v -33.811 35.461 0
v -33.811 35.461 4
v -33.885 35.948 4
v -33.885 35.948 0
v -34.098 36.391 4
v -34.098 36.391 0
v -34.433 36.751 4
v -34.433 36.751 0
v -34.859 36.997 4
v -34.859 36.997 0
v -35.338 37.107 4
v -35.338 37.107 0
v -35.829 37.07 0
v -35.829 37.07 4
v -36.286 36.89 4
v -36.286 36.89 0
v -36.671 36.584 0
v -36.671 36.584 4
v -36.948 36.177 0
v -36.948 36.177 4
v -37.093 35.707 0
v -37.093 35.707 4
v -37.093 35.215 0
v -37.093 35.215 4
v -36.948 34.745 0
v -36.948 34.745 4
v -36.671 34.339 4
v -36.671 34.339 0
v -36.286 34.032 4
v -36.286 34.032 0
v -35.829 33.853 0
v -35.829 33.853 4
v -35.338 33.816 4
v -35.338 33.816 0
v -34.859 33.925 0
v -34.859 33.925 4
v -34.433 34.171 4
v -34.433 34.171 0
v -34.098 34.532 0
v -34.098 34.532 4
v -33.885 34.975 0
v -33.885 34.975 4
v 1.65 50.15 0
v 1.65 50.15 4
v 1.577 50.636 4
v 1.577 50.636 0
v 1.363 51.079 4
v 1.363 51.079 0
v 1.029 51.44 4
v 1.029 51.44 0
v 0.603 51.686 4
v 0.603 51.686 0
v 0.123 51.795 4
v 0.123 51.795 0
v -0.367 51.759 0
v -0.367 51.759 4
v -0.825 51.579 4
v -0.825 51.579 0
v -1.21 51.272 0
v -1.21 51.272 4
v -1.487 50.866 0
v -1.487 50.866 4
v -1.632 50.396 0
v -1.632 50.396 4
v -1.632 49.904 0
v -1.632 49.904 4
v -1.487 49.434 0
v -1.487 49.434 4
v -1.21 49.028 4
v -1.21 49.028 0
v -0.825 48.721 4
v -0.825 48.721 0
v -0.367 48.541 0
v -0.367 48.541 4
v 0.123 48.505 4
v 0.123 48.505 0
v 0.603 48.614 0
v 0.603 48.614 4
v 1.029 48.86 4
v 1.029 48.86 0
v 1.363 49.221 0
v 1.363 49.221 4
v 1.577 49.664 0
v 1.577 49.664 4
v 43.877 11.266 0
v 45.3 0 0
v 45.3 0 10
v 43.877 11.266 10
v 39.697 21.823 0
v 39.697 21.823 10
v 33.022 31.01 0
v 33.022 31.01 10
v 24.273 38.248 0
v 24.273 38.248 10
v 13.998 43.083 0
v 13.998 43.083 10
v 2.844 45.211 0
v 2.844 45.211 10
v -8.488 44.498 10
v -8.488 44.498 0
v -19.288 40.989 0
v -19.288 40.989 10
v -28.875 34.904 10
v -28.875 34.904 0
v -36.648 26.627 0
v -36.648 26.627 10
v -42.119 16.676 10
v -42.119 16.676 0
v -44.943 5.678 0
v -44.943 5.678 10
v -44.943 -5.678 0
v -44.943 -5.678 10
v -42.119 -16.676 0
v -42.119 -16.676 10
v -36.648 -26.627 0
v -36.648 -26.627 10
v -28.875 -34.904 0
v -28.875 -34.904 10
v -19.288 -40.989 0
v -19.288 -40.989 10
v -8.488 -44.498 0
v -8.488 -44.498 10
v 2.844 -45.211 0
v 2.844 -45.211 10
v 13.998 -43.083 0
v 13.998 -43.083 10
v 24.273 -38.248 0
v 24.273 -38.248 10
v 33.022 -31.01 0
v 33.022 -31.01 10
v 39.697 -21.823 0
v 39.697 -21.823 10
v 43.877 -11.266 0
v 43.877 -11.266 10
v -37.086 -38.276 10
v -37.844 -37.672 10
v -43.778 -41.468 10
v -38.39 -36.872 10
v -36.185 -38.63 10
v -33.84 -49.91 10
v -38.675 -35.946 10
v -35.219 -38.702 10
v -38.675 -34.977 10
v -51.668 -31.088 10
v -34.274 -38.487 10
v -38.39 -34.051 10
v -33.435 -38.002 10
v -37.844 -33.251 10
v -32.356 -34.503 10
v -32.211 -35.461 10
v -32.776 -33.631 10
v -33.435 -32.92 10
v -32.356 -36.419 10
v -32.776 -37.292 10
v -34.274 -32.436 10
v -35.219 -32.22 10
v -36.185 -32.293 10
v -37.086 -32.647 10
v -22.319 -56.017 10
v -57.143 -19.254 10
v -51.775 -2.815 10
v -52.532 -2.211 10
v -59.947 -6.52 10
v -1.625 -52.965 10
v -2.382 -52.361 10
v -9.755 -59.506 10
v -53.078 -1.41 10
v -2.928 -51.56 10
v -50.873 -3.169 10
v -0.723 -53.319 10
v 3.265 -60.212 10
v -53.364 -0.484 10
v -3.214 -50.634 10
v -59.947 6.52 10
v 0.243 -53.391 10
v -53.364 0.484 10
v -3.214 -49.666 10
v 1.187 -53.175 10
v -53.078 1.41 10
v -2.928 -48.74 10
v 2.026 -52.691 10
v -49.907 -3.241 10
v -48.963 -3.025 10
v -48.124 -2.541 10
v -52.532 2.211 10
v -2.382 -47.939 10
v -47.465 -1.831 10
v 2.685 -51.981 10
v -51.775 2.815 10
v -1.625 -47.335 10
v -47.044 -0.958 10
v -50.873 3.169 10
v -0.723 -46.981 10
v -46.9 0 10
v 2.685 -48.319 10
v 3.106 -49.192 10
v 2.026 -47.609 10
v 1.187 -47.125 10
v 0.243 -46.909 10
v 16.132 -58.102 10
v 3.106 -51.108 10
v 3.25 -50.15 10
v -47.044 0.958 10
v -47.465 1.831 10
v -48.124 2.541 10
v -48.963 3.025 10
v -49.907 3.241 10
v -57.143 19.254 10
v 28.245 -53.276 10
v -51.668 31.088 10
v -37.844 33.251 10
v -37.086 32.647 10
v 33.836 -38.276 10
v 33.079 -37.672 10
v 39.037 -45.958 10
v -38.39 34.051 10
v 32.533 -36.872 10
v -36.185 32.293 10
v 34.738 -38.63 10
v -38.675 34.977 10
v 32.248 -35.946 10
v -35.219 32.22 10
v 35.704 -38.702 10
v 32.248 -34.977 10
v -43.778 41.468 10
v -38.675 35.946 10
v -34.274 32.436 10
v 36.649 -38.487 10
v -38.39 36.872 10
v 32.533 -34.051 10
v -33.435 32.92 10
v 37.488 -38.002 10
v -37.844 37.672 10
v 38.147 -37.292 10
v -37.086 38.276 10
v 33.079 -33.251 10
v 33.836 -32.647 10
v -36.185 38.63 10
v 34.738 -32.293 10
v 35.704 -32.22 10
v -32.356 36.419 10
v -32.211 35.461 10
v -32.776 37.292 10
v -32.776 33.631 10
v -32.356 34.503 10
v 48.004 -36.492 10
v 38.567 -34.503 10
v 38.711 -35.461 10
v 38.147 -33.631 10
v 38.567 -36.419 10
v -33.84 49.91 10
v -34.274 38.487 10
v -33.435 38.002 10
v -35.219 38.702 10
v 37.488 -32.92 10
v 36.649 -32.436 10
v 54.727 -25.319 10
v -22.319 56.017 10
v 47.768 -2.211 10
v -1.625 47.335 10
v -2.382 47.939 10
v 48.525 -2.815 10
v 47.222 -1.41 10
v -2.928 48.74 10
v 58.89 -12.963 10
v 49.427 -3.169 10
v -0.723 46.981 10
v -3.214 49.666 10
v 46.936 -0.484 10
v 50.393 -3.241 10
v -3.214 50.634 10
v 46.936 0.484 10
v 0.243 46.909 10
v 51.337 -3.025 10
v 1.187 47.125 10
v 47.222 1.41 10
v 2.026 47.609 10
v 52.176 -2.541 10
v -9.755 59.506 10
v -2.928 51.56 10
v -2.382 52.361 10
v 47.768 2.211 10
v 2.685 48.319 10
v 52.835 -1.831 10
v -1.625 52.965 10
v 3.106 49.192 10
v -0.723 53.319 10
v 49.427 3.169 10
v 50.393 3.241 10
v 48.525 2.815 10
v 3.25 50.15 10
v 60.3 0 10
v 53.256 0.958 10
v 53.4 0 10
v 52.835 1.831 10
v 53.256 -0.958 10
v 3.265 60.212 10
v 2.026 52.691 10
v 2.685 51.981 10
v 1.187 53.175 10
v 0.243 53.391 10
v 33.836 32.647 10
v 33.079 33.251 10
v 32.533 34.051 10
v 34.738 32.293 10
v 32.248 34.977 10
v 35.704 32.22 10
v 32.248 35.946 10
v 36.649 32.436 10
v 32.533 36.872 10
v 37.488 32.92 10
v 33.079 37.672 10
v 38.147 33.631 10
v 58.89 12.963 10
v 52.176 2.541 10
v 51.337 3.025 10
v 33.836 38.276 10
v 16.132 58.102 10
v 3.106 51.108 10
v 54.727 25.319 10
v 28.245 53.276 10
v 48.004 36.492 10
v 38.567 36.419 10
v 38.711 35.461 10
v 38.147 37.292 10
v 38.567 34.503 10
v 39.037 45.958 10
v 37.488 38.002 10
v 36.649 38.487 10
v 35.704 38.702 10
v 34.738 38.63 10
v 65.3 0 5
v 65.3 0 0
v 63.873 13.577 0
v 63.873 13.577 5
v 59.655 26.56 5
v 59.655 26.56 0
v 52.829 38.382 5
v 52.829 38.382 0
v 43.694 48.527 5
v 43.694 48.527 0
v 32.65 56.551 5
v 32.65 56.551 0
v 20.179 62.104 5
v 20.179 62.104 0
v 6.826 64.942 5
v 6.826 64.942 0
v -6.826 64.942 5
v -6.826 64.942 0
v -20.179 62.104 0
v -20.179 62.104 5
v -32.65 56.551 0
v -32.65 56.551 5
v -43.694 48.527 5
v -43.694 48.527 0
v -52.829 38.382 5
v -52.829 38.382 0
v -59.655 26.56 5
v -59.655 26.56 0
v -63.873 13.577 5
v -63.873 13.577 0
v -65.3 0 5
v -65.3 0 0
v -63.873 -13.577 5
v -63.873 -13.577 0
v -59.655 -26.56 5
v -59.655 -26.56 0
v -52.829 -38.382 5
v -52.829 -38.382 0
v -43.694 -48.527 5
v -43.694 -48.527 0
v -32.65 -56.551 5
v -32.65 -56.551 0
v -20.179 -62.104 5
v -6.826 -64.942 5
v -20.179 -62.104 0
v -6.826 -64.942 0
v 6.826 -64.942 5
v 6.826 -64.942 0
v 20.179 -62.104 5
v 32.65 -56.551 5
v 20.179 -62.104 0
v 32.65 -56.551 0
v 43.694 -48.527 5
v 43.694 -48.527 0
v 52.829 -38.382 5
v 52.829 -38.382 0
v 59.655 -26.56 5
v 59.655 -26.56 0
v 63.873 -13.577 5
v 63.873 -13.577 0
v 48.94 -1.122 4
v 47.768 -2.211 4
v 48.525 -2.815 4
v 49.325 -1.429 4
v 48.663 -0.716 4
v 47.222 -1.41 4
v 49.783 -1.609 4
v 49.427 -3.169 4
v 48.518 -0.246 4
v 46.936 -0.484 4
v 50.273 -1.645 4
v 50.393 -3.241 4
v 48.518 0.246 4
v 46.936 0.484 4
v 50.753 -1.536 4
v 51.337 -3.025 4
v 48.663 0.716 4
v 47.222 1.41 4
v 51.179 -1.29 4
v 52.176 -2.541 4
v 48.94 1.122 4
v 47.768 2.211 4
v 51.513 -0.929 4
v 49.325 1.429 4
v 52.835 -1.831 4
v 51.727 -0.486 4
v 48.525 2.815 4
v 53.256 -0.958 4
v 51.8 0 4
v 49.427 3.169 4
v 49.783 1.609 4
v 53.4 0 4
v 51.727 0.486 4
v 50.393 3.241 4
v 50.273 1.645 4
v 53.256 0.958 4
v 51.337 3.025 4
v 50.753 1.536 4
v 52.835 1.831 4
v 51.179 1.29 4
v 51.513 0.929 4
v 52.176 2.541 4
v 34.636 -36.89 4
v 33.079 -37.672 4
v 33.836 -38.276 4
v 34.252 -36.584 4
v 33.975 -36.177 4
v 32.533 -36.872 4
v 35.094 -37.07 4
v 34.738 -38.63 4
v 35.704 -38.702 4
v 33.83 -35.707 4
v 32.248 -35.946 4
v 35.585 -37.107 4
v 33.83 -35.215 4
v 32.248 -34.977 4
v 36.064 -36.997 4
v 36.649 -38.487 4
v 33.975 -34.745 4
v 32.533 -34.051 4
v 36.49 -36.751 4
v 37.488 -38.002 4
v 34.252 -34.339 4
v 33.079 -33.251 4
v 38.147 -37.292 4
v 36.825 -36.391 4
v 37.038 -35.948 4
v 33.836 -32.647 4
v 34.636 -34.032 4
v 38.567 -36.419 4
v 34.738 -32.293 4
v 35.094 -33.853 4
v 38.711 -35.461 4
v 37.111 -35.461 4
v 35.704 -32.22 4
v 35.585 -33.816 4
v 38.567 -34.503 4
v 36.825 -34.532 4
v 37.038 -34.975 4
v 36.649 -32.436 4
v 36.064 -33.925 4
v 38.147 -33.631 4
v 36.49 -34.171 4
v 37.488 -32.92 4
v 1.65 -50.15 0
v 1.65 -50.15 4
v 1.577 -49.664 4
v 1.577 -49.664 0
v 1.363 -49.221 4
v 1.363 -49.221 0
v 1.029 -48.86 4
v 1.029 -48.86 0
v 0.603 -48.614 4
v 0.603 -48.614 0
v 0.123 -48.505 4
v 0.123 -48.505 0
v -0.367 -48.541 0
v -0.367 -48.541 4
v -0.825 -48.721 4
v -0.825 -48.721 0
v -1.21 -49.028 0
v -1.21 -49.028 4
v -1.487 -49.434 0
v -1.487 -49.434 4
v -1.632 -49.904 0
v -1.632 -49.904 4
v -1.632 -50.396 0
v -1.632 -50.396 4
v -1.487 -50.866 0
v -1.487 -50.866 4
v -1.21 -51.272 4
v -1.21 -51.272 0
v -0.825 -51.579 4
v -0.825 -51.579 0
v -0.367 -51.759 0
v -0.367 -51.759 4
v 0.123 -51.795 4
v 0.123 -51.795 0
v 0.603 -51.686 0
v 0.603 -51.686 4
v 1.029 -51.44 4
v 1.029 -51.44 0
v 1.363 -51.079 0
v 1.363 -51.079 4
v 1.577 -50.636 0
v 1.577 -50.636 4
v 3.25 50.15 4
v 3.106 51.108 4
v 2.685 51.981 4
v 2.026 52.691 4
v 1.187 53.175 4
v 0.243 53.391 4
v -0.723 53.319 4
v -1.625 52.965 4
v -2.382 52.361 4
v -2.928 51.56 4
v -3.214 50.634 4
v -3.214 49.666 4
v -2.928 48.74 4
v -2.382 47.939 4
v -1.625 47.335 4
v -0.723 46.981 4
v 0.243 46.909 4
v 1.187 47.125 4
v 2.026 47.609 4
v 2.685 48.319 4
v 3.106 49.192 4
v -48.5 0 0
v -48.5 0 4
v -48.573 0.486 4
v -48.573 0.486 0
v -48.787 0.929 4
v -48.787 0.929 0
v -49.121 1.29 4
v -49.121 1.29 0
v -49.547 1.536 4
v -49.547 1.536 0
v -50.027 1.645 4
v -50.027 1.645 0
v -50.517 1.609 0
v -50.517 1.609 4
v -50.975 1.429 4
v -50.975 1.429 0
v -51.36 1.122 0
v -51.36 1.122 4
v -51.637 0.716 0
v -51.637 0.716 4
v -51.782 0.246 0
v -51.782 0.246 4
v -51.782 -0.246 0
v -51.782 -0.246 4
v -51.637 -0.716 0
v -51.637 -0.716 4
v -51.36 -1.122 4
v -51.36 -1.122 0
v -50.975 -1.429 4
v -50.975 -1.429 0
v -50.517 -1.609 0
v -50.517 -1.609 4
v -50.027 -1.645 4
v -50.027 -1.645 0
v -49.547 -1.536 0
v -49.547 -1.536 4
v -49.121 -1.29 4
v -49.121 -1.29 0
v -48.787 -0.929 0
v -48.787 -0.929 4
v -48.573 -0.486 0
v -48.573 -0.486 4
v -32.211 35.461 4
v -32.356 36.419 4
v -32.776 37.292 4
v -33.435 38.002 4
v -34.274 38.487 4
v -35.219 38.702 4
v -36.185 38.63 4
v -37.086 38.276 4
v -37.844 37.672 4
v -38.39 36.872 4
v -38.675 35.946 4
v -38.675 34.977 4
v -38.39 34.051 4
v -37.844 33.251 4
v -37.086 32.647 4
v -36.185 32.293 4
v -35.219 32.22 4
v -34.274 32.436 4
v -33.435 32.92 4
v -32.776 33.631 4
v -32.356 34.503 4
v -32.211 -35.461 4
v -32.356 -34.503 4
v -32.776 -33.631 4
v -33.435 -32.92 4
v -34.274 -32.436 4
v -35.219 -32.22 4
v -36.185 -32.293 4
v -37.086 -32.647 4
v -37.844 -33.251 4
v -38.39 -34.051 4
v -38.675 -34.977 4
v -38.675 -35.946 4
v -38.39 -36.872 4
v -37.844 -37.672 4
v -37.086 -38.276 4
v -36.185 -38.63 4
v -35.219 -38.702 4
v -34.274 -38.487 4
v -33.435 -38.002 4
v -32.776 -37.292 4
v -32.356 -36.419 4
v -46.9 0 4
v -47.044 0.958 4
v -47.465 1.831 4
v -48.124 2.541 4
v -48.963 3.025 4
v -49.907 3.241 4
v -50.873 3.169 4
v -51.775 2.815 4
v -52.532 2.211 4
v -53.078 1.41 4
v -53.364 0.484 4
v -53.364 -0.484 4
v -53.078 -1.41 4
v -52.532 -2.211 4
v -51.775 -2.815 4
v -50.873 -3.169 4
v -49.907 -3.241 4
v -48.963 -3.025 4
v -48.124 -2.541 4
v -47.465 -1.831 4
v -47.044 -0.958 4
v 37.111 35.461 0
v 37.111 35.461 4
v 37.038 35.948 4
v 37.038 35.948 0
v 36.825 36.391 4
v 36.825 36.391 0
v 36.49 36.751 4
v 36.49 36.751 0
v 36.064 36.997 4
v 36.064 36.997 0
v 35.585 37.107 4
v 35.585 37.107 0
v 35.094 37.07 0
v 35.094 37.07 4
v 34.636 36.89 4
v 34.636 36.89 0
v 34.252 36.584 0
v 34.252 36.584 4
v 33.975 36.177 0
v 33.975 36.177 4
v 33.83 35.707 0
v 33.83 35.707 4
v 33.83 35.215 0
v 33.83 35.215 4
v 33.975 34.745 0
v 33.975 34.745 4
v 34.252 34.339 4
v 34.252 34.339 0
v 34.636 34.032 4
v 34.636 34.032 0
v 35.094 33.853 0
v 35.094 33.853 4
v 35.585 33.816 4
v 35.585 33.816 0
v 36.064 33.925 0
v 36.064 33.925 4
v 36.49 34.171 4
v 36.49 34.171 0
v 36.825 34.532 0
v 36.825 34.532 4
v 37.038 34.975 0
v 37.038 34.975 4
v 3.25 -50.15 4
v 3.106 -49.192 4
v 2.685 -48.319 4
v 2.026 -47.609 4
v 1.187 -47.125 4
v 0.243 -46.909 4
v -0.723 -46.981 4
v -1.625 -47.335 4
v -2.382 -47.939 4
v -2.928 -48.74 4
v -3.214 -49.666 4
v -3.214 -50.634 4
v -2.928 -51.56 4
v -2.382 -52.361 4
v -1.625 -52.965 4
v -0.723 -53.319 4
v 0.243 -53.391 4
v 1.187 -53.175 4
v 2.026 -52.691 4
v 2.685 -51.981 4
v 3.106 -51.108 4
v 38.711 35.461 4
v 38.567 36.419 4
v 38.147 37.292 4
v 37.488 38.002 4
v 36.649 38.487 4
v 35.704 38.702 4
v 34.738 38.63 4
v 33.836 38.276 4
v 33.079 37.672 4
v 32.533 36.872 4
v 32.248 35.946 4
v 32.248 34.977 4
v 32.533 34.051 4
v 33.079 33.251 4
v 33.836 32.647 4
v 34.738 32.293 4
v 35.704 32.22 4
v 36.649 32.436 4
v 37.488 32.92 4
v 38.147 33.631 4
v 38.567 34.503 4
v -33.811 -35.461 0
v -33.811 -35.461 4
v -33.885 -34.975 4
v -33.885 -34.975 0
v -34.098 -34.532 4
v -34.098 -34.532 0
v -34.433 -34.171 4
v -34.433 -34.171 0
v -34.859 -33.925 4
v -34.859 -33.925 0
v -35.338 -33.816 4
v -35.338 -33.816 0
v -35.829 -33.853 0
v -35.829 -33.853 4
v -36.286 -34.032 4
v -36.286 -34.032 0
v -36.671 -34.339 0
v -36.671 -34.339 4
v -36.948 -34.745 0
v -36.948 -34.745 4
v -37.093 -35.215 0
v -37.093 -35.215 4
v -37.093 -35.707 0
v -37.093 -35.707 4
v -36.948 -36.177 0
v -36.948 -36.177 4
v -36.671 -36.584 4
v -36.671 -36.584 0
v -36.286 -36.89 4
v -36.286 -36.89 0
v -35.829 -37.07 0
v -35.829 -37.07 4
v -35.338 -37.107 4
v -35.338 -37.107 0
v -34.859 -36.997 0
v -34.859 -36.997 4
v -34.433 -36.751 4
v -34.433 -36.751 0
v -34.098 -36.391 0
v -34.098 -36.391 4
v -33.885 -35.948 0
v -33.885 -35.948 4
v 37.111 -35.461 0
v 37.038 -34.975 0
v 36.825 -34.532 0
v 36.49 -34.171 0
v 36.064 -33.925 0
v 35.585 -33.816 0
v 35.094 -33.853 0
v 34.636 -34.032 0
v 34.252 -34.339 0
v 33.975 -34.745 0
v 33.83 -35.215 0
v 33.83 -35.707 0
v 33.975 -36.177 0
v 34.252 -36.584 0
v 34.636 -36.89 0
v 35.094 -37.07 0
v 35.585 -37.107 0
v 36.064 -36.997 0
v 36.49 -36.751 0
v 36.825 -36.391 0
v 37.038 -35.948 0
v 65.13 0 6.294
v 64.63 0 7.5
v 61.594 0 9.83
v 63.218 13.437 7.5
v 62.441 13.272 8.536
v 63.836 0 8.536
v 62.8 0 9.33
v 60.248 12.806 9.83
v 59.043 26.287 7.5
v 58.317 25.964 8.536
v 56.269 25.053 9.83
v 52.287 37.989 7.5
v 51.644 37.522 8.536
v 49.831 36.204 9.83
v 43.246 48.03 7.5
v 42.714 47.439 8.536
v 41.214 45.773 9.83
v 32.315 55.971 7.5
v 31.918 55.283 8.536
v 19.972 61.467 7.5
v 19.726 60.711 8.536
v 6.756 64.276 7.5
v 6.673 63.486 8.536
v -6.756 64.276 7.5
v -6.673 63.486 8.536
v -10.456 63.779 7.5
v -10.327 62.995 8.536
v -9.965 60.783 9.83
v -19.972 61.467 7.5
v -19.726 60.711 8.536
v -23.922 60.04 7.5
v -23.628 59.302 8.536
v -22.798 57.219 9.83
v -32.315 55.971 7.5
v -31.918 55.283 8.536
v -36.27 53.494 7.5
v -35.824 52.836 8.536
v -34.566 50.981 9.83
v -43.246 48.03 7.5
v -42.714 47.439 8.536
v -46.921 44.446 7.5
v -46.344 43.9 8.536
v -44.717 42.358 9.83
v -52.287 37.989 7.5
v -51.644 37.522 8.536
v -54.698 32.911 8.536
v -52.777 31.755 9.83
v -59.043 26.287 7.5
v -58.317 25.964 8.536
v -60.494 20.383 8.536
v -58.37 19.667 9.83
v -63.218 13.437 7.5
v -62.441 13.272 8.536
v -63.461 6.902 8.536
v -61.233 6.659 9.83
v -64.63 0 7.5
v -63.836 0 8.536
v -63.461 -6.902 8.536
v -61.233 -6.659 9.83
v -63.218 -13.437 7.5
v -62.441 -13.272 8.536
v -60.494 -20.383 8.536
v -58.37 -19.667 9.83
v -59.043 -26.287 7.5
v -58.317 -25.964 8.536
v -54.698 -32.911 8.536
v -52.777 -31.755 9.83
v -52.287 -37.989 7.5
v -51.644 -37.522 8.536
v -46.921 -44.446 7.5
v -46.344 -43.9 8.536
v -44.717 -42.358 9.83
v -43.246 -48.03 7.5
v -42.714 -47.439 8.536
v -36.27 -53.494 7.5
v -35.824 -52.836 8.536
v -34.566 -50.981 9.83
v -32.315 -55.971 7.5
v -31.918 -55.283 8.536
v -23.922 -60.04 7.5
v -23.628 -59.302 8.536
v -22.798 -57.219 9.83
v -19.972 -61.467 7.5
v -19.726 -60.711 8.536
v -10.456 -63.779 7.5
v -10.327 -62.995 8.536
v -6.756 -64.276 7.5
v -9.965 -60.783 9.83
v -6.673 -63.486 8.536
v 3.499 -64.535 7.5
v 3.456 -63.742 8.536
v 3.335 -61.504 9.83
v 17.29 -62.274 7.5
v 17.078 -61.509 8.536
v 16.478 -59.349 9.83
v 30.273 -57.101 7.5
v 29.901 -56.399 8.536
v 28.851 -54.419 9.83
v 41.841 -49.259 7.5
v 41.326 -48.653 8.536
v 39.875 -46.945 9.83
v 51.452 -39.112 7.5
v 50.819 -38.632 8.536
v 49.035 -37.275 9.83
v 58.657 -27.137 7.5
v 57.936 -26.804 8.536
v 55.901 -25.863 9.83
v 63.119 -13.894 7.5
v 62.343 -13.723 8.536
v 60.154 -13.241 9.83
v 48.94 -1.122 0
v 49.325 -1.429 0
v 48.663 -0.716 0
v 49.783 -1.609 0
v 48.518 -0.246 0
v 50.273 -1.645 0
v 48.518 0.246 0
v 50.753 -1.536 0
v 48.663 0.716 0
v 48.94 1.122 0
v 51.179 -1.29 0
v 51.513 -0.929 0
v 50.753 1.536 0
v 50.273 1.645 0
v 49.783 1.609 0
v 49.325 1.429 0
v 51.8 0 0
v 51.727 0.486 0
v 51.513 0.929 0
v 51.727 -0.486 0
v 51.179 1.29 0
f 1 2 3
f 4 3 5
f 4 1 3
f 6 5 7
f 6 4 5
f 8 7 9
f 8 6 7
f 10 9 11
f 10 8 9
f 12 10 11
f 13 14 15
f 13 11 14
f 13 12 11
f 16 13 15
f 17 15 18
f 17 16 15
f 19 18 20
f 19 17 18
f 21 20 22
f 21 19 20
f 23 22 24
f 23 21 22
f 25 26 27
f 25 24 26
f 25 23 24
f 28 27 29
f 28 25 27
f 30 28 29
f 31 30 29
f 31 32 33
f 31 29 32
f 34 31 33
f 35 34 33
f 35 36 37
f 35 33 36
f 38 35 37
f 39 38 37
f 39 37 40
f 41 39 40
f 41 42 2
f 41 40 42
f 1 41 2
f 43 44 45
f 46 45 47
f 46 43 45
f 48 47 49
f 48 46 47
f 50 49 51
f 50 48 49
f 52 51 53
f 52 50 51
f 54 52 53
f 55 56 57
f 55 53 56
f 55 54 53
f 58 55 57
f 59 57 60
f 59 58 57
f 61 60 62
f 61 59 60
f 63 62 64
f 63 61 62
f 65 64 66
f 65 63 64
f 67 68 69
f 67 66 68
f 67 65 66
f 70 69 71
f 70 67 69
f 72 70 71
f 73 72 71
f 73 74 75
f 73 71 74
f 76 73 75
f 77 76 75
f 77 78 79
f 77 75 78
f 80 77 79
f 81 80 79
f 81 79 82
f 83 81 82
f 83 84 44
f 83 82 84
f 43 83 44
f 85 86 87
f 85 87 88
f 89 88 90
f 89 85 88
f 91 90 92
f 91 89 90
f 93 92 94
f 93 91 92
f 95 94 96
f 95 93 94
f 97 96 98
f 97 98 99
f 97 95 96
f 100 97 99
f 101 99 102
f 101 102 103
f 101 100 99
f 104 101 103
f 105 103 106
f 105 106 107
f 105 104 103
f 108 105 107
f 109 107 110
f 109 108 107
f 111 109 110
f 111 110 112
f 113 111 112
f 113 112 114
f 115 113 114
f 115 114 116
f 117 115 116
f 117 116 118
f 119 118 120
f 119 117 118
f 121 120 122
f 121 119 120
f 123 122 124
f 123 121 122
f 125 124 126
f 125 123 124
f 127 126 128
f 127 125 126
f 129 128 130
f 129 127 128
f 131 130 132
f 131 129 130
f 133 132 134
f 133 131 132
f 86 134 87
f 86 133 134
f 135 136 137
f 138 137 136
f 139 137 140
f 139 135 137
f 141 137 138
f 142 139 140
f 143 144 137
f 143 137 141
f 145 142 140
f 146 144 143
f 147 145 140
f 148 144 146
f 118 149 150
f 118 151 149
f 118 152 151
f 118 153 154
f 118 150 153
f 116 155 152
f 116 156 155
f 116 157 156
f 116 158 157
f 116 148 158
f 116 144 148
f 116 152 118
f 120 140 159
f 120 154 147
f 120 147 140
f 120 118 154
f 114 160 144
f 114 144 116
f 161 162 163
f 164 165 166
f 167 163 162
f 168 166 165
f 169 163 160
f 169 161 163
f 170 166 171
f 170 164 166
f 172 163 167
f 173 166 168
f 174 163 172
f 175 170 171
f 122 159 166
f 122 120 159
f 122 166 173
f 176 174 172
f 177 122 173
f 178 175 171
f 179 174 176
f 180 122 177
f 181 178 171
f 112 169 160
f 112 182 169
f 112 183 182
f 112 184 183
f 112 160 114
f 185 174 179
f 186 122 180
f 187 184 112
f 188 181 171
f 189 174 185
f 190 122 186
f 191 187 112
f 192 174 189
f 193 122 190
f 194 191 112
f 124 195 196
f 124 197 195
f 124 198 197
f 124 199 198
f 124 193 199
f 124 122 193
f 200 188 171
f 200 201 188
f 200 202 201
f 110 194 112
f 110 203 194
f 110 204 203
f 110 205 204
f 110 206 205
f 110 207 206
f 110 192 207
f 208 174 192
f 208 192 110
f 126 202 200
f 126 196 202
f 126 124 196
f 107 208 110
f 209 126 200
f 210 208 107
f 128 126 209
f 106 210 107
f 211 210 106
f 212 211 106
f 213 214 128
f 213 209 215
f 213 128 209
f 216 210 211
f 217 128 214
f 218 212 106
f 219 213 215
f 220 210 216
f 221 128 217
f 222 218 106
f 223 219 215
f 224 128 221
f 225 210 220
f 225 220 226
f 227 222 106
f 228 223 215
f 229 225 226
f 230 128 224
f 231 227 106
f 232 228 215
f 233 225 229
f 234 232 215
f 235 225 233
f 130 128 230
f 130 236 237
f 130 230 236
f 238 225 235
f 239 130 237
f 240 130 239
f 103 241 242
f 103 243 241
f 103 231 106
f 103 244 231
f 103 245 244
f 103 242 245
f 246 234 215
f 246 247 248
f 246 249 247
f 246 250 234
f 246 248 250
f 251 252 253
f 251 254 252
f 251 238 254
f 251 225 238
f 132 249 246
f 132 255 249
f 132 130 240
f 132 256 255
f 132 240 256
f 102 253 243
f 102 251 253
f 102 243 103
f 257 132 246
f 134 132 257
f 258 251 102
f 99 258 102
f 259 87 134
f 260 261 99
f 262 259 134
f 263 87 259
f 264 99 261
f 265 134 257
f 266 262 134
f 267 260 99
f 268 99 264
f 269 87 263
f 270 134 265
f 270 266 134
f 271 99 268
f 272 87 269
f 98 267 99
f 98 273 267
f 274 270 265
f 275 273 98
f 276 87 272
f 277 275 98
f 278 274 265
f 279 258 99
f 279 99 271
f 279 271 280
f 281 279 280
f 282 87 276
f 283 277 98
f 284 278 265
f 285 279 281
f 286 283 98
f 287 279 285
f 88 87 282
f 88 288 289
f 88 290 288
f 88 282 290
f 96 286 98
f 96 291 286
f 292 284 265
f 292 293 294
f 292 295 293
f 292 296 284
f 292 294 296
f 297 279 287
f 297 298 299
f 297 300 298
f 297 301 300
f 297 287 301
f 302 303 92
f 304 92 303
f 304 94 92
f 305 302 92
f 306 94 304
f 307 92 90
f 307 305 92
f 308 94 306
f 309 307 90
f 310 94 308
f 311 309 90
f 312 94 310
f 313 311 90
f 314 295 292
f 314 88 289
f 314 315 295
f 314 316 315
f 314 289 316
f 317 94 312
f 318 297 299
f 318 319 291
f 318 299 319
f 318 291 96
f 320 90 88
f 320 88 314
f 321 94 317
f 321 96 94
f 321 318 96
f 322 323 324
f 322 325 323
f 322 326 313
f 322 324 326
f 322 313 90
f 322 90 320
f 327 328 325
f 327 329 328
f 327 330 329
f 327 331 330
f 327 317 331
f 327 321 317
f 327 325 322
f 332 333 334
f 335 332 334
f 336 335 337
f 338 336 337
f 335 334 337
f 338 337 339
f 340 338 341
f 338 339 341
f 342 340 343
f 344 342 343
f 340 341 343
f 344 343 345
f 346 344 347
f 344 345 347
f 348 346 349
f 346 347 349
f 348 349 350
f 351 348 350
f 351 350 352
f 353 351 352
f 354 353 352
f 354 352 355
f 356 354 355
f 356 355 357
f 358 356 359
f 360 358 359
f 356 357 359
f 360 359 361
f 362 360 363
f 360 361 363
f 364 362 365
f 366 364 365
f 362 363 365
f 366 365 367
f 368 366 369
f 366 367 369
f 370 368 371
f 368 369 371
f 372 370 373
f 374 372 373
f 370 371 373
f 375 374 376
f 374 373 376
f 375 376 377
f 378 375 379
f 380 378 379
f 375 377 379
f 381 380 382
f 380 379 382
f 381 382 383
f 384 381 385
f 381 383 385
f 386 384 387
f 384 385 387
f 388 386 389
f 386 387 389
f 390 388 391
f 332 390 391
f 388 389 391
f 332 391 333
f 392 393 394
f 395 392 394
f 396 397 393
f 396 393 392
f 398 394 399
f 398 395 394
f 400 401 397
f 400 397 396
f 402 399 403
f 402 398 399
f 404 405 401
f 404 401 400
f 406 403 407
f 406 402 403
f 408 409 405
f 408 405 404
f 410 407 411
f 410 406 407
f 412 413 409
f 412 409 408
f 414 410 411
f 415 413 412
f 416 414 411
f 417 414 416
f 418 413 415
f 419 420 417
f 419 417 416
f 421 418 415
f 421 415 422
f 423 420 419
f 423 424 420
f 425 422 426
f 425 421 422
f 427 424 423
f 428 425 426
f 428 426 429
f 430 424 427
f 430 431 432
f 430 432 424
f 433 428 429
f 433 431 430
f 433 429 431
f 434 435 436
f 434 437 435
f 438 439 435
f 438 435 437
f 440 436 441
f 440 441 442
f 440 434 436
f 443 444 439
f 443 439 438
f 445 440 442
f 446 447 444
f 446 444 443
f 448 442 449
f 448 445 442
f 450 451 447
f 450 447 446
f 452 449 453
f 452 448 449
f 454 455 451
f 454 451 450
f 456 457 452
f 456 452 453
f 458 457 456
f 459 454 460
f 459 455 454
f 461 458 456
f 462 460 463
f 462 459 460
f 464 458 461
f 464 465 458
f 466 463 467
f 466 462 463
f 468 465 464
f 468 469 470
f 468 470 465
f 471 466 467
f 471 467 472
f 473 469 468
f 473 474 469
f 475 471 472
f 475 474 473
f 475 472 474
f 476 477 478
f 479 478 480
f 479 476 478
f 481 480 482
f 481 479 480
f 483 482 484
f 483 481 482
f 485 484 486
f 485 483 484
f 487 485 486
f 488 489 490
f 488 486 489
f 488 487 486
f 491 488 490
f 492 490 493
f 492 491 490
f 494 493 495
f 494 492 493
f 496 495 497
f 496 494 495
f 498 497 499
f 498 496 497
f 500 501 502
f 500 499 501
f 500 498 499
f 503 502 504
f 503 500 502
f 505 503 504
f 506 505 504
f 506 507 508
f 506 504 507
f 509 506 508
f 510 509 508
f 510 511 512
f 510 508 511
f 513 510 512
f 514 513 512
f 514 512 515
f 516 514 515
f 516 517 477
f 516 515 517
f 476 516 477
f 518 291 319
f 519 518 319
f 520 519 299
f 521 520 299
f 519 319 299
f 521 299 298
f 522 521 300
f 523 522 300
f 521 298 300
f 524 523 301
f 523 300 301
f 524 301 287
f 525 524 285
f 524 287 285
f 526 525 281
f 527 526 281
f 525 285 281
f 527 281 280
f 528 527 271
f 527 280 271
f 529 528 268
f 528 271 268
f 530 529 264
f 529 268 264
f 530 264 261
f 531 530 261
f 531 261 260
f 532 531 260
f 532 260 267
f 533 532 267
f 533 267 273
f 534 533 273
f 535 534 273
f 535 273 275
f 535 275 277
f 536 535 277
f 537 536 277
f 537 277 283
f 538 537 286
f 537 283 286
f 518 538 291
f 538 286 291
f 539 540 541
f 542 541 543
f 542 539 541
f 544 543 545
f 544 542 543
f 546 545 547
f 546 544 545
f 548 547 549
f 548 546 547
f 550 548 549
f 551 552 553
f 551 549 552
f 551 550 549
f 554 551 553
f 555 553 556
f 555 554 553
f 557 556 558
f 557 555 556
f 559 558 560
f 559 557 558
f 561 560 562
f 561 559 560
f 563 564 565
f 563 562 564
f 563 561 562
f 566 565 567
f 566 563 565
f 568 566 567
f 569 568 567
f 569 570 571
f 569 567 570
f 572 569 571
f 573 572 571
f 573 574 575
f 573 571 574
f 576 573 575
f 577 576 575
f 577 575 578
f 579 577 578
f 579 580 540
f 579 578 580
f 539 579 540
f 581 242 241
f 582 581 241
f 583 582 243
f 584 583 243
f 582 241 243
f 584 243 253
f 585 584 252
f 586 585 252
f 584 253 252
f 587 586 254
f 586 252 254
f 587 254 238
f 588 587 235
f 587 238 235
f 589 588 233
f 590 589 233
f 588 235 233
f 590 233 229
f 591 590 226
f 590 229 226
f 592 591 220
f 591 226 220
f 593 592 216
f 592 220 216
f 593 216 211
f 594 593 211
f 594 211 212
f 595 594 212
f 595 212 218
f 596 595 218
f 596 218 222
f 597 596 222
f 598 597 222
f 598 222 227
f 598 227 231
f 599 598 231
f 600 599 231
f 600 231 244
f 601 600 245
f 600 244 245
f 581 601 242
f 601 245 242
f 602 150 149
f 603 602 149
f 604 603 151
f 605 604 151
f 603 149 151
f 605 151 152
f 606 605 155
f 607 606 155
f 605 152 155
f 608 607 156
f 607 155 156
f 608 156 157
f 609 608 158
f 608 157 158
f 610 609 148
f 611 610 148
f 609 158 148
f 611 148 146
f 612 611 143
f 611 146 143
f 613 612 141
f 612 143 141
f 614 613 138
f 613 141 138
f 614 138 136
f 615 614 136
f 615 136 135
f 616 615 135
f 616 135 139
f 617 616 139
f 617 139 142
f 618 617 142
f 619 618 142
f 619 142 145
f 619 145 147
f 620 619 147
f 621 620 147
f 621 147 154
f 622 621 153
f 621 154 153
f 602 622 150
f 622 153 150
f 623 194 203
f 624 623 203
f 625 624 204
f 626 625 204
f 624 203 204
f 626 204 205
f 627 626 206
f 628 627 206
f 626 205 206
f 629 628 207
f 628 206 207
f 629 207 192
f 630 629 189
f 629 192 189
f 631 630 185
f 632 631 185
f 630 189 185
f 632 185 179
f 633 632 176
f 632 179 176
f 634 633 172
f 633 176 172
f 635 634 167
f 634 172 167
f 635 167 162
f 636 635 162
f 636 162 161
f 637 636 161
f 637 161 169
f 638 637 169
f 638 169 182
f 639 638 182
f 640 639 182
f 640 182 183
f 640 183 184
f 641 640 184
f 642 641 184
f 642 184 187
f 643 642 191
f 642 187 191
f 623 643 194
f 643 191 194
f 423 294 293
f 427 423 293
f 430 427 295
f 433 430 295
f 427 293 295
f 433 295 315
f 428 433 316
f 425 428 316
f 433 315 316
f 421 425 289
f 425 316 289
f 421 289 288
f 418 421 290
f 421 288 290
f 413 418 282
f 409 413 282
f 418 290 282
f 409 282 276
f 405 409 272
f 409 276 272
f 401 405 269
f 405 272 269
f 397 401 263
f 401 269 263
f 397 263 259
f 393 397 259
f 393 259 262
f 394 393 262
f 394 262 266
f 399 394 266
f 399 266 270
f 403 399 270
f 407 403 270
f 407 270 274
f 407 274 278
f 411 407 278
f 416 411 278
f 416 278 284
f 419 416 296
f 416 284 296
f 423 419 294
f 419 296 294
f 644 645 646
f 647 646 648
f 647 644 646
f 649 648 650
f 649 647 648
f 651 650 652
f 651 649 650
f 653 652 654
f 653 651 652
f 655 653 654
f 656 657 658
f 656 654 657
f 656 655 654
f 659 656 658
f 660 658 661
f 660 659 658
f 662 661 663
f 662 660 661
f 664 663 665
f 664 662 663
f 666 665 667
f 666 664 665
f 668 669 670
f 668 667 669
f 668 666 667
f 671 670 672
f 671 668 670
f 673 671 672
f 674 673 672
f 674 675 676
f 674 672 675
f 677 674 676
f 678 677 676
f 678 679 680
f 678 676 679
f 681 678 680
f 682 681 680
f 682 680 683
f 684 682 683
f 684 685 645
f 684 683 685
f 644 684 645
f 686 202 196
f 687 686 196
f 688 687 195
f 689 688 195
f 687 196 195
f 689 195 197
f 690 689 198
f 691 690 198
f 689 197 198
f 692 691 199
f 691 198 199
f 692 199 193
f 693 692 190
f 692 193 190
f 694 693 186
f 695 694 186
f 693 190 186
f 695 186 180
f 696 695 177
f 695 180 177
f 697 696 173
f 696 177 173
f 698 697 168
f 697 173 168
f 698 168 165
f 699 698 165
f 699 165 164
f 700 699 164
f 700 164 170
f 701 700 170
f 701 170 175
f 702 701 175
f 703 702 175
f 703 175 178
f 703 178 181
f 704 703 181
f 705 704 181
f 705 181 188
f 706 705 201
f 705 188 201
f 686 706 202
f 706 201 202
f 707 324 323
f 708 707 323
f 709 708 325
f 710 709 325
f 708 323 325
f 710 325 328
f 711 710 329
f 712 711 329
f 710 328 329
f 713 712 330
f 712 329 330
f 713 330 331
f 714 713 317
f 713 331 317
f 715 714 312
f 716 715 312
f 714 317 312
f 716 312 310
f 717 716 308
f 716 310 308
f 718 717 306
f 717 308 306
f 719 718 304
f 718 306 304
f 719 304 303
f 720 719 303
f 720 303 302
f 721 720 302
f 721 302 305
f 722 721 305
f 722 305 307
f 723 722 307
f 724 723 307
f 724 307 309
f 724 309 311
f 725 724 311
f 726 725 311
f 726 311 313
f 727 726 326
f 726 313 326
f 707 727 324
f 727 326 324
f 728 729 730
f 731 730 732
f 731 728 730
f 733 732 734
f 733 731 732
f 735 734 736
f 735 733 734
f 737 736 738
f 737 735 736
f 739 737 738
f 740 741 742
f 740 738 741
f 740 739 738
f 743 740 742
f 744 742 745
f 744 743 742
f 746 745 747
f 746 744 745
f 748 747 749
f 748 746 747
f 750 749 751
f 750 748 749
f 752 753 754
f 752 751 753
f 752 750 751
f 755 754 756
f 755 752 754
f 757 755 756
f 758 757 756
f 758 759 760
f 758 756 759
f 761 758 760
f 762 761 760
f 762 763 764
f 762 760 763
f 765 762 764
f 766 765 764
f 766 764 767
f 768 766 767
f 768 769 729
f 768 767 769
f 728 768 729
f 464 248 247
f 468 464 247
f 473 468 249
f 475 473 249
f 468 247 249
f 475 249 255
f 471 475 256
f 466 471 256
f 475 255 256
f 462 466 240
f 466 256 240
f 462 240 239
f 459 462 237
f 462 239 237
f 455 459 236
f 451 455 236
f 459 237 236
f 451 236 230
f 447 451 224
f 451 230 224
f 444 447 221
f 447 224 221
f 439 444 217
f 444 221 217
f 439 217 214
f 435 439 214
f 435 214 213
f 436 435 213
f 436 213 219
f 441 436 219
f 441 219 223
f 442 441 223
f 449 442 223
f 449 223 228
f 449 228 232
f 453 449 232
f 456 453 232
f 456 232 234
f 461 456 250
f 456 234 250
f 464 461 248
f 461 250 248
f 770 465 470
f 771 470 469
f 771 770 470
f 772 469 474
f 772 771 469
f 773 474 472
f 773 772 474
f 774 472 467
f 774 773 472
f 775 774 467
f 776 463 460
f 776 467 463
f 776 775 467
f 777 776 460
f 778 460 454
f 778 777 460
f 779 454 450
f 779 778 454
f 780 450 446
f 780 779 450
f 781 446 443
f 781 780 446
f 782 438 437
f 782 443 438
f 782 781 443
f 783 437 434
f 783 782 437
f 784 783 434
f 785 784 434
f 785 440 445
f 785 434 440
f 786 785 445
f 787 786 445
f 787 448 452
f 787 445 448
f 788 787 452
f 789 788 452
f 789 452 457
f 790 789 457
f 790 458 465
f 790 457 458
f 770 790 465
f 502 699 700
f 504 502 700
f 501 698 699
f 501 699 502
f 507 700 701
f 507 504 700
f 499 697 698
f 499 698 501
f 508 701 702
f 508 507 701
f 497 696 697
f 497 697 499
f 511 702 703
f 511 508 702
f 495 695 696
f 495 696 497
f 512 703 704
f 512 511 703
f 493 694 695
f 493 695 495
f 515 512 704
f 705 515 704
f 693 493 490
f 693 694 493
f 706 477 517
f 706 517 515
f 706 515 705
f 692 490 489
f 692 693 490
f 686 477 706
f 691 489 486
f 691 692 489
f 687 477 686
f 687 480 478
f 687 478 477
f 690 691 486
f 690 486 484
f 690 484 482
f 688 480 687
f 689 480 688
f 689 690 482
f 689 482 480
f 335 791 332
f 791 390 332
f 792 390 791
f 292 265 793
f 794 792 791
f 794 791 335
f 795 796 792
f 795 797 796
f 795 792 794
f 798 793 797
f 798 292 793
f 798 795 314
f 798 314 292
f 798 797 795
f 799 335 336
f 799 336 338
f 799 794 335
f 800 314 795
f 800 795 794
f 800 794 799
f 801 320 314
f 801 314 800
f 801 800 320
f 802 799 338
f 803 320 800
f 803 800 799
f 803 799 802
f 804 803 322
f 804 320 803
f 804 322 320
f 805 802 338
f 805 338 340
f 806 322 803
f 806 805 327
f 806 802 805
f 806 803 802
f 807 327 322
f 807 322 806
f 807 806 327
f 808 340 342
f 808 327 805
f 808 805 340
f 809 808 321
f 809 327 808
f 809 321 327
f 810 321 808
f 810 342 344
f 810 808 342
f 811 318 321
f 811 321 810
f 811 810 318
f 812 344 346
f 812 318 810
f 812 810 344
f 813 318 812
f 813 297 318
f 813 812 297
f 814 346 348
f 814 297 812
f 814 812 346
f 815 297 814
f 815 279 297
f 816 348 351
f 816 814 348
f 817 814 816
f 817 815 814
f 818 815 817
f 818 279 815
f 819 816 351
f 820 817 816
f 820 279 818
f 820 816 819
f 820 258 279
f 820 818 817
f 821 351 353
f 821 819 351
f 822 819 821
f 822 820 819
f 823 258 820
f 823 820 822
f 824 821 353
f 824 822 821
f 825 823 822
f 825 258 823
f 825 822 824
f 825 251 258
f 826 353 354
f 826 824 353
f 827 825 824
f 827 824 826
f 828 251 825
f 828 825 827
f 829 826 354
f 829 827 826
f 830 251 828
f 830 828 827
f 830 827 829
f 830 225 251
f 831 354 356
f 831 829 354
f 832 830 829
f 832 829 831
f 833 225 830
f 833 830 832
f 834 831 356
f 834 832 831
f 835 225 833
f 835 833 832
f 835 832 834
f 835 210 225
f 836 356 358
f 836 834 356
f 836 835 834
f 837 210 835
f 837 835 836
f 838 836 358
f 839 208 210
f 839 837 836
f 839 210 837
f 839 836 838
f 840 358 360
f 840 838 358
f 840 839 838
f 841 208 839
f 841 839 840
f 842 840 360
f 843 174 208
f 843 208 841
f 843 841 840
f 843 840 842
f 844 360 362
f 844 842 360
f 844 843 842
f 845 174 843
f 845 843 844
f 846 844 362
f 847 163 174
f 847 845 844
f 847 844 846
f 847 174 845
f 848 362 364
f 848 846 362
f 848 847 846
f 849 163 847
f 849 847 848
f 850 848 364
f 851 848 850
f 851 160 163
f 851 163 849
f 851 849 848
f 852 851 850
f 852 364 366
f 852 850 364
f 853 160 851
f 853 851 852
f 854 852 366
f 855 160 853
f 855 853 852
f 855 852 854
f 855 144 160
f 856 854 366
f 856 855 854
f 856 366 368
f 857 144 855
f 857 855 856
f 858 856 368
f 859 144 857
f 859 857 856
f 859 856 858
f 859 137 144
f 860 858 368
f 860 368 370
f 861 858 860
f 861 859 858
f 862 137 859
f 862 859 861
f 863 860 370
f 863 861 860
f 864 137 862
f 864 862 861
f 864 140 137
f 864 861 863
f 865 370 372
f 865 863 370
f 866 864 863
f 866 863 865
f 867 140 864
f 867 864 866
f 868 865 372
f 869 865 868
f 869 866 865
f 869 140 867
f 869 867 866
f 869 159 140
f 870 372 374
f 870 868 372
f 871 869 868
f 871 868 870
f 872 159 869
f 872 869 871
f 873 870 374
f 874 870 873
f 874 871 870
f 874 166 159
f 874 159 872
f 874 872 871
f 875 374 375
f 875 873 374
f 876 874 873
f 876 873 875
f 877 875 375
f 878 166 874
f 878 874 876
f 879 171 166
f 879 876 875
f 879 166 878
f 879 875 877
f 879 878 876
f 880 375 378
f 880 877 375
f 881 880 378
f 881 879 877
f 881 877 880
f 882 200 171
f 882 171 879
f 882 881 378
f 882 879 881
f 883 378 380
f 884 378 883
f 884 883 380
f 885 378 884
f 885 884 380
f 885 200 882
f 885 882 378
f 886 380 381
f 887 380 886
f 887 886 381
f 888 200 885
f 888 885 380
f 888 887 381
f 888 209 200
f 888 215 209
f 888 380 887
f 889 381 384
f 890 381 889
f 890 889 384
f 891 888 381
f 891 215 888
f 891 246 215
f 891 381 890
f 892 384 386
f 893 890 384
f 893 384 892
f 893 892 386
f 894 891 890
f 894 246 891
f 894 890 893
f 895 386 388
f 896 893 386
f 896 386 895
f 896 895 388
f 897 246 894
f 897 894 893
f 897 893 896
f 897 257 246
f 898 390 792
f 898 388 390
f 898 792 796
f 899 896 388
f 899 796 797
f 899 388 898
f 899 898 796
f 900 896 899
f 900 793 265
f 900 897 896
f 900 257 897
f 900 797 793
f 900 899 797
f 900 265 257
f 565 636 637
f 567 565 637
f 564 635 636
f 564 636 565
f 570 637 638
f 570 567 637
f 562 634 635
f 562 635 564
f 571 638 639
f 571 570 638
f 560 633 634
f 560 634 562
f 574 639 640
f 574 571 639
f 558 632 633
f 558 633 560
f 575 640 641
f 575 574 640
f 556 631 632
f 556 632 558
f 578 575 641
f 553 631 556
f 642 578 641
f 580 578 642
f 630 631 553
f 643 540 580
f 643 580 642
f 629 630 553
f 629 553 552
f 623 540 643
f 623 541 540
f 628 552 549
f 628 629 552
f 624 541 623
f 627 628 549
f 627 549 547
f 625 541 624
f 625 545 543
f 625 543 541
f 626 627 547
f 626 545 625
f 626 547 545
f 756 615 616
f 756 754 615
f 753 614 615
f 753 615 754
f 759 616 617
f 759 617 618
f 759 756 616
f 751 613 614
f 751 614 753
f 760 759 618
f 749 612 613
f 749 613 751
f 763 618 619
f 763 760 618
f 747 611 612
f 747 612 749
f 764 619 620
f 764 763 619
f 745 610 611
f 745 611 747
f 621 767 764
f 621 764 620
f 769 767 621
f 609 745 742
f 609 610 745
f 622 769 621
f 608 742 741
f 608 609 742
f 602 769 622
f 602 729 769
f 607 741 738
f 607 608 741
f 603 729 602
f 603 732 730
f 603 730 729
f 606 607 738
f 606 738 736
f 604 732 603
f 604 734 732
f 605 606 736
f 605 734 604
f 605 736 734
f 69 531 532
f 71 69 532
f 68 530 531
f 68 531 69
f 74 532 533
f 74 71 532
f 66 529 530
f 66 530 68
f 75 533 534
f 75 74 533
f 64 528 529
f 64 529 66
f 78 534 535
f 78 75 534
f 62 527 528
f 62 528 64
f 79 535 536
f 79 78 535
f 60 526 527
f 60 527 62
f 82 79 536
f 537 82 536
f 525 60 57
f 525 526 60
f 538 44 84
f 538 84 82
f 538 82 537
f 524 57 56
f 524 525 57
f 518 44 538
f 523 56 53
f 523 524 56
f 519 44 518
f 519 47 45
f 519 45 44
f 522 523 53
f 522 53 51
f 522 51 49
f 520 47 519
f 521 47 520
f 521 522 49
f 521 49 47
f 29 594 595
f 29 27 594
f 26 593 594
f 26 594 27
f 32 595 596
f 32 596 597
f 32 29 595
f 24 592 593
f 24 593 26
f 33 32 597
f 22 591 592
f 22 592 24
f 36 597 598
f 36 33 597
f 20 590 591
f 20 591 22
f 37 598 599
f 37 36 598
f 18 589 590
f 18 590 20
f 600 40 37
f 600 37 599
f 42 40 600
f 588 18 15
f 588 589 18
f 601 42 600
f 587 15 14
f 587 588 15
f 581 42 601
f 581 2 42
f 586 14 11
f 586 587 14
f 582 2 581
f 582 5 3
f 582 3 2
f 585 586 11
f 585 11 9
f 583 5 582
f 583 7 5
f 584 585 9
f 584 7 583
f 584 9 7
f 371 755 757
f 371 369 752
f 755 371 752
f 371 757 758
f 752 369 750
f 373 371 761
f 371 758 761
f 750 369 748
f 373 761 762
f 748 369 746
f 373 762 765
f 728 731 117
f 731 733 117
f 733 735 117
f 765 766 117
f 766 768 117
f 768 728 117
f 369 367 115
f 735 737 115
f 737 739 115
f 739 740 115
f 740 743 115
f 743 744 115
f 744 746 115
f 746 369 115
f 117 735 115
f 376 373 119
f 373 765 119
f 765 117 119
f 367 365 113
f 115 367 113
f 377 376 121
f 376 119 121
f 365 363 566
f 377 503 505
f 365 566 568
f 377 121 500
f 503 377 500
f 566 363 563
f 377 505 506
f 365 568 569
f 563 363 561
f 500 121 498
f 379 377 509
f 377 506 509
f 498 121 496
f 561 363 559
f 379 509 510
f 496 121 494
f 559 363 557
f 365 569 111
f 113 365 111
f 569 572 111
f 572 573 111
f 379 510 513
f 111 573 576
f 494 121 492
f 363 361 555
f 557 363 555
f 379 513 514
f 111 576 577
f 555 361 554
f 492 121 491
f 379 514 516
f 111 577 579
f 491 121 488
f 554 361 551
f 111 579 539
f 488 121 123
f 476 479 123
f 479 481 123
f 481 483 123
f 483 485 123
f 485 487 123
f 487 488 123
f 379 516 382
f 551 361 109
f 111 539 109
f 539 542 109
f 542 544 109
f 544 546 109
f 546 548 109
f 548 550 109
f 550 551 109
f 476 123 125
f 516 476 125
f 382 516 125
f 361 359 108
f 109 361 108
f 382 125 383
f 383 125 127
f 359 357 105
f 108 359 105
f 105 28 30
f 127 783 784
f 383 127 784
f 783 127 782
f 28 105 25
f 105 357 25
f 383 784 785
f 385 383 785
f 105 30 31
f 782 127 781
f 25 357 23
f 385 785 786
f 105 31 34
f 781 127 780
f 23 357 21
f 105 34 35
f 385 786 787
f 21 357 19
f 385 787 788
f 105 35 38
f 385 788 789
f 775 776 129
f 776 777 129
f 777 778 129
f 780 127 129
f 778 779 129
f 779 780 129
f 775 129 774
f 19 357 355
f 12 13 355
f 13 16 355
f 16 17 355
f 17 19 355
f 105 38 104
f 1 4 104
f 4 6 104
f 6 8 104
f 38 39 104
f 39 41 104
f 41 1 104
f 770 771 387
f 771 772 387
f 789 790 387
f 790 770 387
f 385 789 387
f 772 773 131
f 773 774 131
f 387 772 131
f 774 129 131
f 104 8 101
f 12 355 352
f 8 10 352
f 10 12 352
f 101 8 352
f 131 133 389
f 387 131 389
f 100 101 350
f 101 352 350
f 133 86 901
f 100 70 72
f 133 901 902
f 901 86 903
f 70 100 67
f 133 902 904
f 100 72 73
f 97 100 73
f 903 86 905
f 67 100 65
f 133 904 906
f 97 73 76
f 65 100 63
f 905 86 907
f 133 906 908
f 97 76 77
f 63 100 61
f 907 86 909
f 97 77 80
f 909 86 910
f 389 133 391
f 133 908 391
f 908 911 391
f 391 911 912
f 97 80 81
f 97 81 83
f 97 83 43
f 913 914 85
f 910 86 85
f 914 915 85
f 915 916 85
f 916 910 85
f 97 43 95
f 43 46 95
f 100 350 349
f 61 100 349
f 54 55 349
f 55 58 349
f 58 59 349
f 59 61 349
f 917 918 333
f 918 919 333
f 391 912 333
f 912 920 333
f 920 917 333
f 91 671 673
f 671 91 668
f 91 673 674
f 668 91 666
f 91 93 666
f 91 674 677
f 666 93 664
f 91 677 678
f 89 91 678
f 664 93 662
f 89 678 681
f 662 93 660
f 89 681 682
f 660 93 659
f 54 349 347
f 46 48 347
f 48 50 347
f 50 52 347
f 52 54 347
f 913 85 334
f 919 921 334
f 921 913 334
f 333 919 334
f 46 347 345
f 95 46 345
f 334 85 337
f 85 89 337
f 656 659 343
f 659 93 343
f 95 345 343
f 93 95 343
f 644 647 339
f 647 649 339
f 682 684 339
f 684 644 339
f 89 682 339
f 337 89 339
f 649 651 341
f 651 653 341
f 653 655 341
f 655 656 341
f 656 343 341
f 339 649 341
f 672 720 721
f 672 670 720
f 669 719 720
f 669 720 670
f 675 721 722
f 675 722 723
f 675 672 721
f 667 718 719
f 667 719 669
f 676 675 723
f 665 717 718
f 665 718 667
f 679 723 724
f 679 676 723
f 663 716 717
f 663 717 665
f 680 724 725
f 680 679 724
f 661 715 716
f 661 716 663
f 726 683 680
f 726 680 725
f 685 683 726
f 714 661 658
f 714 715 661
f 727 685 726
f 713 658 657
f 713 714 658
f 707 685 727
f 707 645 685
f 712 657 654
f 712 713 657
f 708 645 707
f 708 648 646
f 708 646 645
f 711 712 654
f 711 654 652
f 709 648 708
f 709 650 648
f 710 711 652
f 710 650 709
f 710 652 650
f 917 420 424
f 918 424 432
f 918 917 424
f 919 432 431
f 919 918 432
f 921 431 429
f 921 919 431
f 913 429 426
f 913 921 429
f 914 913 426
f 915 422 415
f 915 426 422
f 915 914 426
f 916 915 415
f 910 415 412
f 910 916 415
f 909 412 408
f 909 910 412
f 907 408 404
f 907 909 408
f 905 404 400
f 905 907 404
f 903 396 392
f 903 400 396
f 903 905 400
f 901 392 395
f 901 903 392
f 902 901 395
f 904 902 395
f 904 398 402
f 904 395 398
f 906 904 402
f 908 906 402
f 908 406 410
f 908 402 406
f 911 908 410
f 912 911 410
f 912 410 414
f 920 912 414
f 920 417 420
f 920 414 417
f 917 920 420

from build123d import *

# Parameters (mm, degrees)
SKETCH1_R           = 65.3
SKETCH1_R_2         = 45.3
SKETCH1_R_3         = 1.65
BOSS_EXTRUDE1_DEPTH = 10
FILLET1_R           = 5
SKETCH2_R           = 3.25
CUT_EXTRUDE1_DEPTH  = 6


with BuildPart() as part:
    # Sketch1 → Boss-Extrude1 (new body)
    with BuildSketch(Plane.XY):
        Circle(SKETCH1_R)
        Circle(SKETCH1_R_2, mode=Mode.SUBTRACT)
        with Locations((35.461405077, -35.461405077)):
            Circle(SKETCH1_R_3, mode=Mode.SUBTRACT)
        with Locations((0, -50.15)):
            Circle(SKETCH1_R_3, mode=Mode.SUBTRACT)
        with Locations((-35.461405077, -35.461405077)):
            Circle(SKETCH1_R_3, mode=Mode.SUBTRACT)
        with Locations((-50.15, 0)):
            Circle(SKETCH1_R_3, mode=Mode.SUBTRACT)
        with Locations((-35.461405077, 35.461405077)):
            Circle(SKETCH1_R_3, mode=Mode.SUBTRACT)
        with Locations((0, 50.15)):
            Circle(SKETCH1_R_3, mode=Mode.SUBTRACT)
        with Locations((35.461405077, 35.461405077)):
            Circle(SKETCH1_R_3, mode=Mode.SUBTRACT)
        with Locations((50.15, 0)):
            Circle(SKETCH1_R_3, mode=Mode.SUBTRACT)
    extrude(amount=BOSS_EXTRUDE1_DEPTH)

    # Fillet1
    fillet1_edges = [part.edges().sort_by_distance(p)[0] for p in [
        (-65.3, 0, 10),
    ]]
    fillet(fillet1_edges, radius=FILLET1_R)

    # Sketch2 → Cut-Extrude1 (cut)
    with BuildSketch(Plane.XY.offset(10)):
        with Locations((-50.15, 0)):
            Circle(SKETCH2_R)
        with Locations((-35.461405077, -35.461405077)):
            Circle(SKETCH2_R)
        with Locations((-35.461405077, 35.461405077)):
            Circle(SKETCH2_R)
        with Locations((0, 50.15)):
            Circle(SKETCH2_R)
        with Locations((35.461405077, 35.461405077)):
            Circle(SKETCH2_R)
        with Locations((50.15, 0)):
            Circle(SKETCH2_R)
        with Locations((35.461405077, -35.461405077)):
            Circle(SKETCH2_R)
        with Locations((0, -50.15)):
            Circle(SKETCH2_R)
    extrude(amount=-CUT_EXTRUDE1_DEPTH, mode=Mode.SUBTRACT)


solid = part.part
